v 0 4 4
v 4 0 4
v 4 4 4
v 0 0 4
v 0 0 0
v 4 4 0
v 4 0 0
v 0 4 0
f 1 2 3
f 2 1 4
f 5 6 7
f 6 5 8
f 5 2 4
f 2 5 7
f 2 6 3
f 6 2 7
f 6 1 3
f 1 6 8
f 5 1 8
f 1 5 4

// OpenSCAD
x = 3.7;
y = -2.5;
z = 2;
w = 3;

echo("round(3.7):", round(x));
echo("floor(-2.5):", floor(y));
echo("ceil(-2.5):", ceil(y));
echo("pow(2, 3):", pow(z, w));

values = [1.1, 2.9, 3.4, 4.6, 5.1];
rounded = [for (v=values) round(v)];
echo("Rounded list:", rounded);

cube(round(x));
